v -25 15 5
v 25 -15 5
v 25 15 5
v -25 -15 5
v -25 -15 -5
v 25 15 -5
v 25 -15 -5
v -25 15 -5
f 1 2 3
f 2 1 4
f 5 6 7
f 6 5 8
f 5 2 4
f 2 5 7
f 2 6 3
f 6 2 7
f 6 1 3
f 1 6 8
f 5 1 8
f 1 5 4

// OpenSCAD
// Parameters
body_length = 50; //[25:100:1]
body_width  = 30; //[15:60:1]
body_height = 10; //[5:20:1]

// Robustness
eps = 0.2;

// Main Body Module (single connected solid)
module main_body() {
    L = max(eps, body_length);
    W = max(eps, body_width);
    H = max(eps, body_height);

    // Ensure non-degenerate geometry and stable render
    color([0.85, 0.85, 0.8])
        cube([L, W, H], center=true);
}

// Final Model
main_body();
